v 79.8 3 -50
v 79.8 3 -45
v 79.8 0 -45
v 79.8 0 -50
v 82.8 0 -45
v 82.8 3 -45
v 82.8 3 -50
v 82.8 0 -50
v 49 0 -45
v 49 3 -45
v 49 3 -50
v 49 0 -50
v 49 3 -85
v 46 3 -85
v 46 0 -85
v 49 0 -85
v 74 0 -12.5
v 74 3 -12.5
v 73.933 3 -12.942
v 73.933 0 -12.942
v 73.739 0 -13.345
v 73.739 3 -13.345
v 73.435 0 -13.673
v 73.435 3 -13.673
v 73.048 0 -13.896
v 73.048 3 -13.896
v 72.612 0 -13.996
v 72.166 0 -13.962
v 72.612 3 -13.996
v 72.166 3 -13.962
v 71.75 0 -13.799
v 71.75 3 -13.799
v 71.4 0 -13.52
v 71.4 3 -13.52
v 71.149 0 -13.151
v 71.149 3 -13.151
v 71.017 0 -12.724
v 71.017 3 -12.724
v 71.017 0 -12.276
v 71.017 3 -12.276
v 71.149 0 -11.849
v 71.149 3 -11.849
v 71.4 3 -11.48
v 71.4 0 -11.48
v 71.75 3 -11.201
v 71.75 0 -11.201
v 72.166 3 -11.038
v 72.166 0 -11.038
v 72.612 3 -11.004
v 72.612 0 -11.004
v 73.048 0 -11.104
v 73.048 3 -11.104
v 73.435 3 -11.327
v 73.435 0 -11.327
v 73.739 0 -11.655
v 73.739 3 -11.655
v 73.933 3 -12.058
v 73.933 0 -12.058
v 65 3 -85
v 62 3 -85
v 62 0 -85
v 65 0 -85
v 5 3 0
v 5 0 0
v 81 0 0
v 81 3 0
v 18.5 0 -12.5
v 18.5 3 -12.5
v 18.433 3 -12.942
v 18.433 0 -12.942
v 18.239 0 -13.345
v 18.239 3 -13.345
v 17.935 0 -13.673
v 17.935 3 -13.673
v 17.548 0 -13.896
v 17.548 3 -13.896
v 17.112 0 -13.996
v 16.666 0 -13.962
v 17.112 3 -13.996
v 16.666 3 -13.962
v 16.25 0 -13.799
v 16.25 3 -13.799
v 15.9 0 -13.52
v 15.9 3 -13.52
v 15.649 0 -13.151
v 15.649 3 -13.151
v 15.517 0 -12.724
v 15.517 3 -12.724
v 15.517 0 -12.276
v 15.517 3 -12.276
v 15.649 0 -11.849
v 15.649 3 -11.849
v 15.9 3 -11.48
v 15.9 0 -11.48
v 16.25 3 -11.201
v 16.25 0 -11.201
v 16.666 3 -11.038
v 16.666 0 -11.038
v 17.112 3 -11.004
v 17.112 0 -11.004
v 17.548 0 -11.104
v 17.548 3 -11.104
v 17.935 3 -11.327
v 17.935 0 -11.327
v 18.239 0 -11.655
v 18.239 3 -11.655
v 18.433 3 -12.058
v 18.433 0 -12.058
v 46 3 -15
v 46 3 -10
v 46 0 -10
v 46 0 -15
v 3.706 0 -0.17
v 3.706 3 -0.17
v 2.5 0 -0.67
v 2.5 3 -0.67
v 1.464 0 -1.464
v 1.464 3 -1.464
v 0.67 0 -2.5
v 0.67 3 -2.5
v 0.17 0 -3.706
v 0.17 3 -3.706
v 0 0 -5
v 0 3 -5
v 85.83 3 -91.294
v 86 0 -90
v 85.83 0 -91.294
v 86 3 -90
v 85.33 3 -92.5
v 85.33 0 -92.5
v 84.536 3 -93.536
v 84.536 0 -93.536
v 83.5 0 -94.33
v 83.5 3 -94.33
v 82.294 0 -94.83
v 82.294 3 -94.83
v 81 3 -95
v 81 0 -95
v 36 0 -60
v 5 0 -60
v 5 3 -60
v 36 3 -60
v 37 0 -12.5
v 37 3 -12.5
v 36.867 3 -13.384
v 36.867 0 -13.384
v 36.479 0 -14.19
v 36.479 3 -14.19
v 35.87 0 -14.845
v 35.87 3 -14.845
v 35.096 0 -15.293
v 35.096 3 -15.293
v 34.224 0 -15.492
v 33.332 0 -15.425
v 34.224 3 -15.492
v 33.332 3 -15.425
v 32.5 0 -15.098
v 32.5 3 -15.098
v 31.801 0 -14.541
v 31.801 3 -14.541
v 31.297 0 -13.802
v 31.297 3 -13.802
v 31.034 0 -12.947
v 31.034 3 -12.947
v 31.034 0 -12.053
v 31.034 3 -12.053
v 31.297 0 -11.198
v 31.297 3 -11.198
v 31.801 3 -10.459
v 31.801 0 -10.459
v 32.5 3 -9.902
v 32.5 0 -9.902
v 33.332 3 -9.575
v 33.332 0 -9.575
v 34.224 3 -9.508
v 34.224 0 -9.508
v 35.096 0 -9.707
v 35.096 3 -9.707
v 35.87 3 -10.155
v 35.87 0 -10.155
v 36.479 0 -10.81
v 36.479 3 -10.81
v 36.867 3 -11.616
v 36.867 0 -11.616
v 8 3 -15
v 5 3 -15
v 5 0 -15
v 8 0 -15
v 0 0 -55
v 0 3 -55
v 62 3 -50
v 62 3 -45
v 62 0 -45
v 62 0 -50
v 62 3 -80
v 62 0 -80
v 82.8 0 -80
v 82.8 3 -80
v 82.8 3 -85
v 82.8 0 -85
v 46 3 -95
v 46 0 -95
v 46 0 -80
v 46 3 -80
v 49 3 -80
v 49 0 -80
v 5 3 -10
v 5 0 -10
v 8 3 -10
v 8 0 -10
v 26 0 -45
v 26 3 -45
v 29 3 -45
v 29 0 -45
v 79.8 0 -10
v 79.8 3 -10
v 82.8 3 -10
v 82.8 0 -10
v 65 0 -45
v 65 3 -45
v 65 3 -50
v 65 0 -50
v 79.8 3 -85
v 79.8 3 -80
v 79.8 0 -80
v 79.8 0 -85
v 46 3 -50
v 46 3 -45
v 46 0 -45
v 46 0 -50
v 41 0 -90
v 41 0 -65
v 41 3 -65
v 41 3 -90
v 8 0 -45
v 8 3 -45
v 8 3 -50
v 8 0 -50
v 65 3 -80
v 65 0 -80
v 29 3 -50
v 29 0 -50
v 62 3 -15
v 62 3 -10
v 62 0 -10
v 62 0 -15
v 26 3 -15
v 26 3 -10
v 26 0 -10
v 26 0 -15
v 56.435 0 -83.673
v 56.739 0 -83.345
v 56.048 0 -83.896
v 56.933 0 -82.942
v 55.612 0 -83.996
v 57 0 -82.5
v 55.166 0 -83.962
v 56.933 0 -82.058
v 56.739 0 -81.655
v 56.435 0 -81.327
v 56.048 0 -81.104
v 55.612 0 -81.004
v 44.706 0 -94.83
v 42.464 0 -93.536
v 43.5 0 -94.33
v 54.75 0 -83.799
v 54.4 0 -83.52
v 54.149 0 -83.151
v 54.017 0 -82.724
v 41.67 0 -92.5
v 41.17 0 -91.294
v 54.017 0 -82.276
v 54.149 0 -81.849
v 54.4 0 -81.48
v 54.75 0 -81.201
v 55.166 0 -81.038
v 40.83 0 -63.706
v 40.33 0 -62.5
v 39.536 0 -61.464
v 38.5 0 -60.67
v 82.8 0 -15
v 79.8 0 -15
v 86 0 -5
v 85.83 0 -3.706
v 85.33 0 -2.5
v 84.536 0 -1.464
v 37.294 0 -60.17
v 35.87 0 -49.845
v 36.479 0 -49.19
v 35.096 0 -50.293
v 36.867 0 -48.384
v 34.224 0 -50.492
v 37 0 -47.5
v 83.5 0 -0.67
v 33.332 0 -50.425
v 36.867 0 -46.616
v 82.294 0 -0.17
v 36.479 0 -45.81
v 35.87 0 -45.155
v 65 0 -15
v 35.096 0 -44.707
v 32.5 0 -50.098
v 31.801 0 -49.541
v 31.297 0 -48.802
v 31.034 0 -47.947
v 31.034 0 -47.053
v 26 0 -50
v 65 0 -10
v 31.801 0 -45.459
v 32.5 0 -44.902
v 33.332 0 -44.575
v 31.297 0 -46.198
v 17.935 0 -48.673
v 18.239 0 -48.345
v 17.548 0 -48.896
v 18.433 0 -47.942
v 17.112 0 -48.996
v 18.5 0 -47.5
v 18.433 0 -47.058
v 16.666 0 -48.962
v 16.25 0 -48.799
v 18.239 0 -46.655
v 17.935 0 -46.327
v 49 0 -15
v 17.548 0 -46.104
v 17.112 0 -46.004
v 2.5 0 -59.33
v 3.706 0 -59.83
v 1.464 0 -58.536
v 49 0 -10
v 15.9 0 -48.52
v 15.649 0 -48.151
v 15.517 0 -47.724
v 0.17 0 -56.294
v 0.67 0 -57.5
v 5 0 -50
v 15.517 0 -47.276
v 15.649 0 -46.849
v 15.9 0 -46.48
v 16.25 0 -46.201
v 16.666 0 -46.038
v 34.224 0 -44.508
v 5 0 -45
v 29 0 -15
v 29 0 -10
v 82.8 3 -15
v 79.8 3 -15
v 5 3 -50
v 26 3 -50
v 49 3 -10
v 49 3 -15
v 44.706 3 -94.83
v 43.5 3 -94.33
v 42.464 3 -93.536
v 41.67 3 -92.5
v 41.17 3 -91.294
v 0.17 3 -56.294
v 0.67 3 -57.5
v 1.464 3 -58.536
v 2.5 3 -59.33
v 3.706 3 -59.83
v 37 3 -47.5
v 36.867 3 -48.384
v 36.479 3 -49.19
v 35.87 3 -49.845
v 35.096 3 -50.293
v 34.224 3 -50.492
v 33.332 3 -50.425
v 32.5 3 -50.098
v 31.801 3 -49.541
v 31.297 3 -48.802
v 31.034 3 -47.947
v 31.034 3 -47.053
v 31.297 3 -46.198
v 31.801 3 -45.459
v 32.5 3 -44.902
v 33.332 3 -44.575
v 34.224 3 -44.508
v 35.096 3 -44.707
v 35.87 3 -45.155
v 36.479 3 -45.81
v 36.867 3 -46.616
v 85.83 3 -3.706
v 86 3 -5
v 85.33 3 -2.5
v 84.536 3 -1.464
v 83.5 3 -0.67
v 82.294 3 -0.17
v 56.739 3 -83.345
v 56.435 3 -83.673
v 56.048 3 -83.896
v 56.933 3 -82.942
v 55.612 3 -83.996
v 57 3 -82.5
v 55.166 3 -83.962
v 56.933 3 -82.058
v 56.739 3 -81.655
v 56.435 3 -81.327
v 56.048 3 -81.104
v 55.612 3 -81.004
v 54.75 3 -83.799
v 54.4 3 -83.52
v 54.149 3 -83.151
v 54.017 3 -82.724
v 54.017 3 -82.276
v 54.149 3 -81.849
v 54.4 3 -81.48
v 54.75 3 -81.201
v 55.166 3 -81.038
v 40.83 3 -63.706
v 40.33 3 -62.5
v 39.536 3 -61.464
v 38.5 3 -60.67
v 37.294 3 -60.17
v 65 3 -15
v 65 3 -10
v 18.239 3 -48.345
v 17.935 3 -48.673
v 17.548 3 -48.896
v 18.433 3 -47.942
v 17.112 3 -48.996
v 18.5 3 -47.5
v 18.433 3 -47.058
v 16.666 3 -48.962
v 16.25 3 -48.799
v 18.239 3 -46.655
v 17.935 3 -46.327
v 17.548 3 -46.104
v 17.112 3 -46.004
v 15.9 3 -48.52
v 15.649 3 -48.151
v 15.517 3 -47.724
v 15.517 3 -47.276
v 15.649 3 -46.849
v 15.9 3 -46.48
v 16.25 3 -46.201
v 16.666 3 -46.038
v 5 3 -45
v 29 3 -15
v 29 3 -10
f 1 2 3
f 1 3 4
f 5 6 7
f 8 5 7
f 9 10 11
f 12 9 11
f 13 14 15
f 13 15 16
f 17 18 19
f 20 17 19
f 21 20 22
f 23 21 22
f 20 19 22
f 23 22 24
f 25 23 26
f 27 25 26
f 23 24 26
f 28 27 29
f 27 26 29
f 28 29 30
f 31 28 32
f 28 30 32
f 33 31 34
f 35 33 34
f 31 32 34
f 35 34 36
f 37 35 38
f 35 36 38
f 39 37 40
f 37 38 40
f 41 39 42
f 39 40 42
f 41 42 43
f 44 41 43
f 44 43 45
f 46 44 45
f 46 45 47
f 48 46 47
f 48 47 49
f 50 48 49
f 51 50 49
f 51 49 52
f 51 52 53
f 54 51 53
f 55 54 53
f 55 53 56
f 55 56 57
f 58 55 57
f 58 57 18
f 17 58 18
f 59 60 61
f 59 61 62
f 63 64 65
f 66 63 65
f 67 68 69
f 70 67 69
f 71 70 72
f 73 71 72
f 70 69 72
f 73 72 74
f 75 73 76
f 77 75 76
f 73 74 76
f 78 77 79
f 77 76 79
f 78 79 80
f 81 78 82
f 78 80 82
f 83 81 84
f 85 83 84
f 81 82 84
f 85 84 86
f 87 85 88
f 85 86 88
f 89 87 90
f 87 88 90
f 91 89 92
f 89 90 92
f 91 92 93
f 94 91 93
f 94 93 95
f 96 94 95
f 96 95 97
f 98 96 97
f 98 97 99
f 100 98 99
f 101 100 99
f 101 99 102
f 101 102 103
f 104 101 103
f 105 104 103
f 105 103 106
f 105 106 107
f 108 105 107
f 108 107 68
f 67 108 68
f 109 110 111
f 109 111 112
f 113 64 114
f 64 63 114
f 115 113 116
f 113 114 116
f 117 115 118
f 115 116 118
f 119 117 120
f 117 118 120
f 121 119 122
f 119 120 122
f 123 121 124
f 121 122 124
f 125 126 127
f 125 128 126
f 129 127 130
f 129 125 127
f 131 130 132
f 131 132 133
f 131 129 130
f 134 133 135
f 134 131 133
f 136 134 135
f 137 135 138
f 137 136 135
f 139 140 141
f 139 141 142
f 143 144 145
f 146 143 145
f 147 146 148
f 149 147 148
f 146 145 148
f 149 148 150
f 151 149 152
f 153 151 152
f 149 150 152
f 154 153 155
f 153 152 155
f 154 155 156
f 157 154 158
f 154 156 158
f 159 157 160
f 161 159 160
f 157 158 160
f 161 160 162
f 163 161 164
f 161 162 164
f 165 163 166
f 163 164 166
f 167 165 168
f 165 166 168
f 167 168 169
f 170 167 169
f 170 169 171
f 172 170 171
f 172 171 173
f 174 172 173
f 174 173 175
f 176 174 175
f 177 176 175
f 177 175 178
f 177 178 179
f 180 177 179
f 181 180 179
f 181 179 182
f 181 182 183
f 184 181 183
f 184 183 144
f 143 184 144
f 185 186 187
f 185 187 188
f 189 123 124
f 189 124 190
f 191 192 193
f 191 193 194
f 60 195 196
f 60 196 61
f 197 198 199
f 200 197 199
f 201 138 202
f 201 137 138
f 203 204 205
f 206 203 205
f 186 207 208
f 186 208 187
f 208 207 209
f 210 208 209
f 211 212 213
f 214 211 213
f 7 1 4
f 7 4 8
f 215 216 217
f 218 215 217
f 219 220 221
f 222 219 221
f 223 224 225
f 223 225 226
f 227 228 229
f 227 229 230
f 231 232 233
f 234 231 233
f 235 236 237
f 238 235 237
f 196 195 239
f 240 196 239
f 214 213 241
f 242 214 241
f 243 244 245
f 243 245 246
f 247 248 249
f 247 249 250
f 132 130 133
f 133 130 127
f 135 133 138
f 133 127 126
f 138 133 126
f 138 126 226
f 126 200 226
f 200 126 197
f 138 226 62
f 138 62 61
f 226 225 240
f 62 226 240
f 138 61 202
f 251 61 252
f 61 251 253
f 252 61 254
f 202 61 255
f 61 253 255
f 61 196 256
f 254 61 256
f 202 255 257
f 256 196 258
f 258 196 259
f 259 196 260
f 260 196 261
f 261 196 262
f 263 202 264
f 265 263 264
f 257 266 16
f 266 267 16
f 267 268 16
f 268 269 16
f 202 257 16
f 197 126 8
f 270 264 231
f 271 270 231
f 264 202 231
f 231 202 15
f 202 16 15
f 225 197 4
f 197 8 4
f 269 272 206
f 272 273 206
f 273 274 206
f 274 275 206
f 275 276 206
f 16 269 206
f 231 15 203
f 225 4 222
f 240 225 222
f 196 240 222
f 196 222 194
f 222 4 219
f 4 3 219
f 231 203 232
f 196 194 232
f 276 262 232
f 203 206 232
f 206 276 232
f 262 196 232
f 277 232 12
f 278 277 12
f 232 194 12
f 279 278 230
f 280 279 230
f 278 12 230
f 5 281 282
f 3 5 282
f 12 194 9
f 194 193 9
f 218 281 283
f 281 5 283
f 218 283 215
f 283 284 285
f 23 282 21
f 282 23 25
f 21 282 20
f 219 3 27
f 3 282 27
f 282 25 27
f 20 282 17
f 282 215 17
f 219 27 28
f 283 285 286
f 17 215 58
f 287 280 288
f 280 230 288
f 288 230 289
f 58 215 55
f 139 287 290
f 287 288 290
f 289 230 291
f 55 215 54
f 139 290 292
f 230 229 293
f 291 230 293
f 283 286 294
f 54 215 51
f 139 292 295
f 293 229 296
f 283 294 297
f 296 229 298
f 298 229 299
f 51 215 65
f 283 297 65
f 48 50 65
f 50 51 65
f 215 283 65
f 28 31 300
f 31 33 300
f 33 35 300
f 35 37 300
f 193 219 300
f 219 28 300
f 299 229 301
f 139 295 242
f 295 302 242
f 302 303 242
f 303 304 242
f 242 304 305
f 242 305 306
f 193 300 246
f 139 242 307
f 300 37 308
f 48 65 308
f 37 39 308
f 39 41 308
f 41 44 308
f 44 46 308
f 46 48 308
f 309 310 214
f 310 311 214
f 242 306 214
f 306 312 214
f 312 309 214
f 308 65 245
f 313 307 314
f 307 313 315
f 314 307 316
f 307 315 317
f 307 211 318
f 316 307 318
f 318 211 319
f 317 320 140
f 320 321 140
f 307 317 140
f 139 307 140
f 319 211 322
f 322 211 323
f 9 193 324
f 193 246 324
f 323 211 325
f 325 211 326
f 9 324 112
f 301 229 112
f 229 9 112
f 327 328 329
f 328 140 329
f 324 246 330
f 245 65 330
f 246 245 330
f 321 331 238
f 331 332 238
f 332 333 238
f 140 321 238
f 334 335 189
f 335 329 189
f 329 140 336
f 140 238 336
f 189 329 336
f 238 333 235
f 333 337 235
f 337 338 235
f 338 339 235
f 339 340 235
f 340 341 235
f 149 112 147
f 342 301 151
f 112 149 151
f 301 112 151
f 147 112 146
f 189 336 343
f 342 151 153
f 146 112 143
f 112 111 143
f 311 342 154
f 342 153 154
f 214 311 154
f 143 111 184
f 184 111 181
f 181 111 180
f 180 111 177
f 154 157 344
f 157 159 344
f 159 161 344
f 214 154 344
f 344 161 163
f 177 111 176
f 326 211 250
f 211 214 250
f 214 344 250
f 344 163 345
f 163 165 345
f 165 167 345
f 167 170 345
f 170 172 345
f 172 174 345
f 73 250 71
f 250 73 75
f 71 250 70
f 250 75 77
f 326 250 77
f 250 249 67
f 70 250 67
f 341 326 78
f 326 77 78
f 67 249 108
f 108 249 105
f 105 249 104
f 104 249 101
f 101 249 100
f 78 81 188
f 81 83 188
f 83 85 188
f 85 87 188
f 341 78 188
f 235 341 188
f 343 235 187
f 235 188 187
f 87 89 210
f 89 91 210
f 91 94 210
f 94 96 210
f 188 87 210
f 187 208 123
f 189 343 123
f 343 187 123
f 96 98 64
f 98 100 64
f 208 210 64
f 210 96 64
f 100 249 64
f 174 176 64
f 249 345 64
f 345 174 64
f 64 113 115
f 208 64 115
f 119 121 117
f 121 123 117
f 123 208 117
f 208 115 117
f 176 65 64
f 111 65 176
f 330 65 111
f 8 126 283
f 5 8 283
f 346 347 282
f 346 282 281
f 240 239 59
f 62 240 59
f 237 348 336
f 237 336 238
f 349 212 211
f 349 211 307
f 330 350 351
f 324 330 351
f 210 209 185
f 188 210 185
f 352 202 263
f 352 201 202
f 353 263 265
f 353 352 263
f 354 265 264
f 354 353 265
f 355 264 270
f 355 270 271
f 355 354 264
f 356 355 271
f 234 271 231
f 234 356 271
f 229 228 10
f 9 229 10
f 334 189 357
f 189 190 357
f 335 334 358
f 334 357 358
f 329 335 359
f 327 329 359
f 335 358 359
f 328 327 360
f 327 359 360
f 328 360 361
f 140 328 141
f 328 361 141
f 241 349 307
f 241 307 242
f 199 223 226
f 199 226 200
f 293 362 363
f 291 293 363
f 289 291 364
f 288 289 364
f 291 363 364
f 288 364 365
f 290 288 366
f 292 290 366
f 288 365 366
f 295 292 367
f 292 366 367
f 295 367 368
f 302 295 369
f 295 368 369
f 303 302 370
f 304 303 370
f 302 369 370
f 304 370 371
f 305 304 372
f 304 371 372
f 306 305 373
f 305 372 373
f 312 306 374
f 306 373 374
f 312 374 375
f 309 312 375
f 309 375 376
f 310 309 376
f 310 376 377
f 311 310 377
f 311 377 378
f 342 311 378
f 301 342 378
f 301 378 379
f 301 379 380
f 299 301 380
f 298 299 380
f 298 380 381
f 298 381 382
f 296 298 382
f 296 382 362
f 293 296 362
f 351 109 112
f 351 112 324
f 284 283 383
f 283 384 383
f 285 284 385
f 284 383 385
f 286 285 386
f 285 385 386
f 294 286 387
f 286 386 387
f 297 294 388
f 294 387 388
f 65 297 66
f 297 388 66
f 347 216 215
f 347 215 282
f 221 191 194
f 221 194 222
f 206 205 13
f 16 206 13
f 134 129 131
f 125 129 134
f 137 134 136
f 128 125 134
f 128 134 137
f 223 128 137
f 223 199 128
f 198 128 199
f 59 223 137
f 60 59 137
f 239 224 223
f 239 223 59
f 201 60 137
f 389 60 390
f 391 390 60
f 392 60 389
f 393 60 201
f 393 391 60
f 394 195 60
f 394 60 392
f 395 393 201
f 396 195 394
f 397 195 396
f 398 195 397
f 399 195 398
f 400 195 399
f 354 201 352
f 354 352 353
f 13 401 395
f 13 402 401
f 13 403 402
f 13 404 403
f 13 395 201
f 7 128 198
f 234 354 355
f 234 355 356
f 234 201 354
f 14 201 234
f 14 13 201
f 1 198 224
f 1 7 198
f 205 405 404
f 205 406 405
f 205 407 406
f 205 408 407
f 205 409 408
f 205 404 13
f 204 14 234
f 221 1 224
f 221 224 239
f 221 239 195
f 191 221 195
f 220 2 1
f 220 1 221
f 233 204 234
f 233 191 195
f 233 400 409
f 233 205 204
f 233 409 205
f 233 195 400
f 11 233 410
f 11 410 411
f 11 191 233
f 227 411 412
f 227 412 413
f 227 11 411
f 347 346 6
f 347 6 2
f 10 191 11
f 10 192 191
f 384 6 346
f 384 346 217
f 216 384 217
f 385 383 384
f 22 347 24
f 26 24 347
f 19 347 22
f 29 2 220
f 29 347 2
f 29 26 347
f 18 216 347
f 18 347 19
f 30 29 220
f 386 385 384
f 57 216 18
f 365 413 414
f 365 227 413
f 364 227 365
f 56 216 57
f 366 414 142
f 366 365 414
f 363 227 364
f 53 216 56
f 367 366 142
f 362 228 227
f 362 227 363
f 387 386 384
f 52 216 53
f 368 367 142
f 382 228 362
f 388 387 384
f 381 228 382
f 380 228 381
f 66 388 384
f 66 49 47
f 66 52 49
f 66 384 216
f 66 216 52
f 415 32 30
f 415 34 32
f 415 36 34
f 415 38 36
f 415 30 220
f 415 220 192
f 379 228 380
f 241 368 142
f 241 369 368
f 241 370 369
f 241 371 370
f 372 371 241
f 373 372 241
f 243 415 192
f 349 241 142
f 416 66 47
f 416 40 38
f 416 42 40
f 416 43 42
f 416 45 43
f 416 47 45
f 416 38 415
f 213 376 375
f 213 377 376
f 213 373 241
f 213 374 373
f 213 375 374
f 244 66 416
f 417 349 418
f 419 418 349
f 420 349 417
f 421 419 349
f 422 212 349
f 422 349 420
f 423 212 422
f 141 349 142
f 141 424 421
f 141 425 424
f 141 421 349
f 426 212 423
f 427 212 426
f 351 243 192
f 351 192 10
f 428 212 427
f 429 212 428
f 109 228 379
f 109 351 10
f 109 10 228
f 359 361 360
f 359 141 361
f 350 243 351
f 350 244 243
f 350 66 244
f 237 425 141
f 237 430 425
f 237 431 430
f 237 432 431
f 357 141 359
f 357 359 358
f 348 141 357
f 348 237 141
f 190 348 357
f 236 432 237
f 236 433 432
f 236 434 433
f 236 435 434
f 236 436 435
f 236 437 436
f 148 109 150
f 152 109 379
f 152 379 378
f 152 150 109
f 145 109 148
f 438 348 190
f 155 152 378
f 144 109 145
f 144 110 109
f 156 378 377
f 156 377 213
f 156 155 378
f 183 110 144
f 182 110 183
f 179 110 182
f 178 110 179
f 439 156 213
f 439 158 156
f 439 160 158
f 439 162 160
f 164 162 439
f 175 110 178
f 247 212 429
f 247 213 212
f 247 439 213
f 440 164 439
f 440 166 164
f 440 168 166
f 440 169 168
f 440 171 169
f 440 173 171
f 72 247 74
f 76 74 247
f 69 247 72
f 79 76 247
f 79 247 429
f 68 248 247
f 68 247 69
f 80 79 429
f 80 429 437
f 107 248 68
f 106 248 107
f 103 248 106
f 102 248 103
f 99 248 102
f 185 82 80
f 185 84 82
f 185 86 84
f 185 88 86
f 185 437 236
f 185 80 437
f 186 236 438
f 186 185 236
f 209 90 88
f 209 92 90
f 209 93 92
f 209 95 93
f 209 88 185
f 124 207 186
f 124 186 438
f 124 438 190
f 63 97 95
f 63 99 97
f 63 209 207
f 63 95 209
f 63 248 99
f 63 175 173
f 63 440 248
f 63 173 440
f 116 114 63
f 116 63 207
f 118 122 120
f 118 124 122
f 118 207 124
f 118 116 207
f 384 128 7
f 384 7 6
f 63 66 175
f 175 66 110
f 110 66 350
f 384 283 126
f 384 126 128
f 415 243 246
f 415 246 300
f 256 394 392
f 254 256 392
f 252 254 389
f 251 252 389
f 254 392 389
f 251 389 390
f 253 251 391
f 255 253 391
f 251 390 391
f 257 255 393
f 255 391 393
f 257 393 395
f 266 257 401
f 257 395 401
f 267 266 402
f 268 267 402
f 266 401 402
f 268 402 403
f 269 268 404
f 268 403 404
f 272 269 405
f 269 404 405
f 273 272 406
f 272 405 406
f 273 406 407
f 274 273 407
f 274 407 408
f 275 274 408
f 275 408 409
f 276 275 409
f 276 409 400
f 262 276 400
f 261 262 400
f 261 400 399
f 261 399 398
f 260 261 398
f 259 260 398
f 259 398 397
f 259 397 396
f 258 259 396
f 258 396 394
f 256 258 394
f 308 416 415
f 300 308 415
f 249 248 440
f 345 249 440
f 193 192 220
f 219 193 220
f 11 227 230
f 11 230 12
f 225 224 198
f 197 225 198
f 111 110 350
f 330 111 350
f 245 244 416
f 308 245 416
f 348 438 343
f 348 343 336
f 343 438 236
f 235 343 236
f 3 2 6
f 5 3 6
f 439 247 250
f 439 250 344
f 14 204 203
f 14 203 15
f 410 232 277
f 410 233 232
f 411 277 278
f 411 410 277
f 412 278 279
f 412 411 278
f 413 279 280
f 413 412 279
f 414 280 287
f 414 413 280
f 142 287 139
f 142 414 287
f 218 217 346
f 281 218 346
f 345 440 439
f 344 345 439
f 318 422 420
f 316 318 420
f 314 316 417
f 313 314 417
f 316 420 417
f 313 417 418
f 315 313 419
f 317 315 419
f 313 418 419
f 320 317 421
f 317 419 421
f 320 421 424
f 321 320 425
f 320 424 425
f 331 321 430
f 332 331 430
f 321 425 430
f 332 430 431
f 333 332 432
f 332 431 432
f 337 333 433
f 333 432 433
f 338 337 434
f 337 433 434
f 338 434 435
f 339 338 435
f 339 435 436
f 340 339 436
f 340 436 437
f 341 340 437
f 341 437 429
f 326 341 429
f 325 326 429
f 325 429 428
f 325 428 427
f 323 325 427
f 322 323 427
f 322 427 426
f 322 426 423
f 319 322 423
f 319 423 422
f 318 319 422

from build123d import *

# Parameters (mm, degrees)
SKETCH1_W           = 86
SKETCH1_H           = 60
BOSS_EXTRUDE1_DEPTH = 3
SKETCH4_W           = 45
SKETCH4_H           = 3
BOSS_EXTRUDE2_DEPTH = 35
SKETCH2_W           = 3
SKETCH2_H           = 5
CUT_EXTRUDE1_DEPTH  = 3
SKETCH8_W           = 3
SKETCH8_H           = 5
CUT_EXTRUDE10_DEPTH = 4
LPATTERN3_COUNT     = 2
LPATTERN3_PITCH     = 35
FILLET1_R           = 5
LPATTERN1_COUNT     = 3
LPATTERN1_PITCH     = 35
SKETCH5_R           = 1.5
CUT_EXTRUDE2_DEPTH  = 4
SKETCH6_R           = 3
CUT_EXTRUDE3_DEPTH  = 4


with BuildPart() as part:
    # Sketch1 → Boss-Extrude1 (new body)
    with BuildSketch(Plane(origin=(0, 0, 0), x_dir=(1, 0, 0), z_dir=(0, 1, 0))):
        with Locations((43, 30)):
            Rectangle(SKETCH1_W, SKETCH1_H)
    extrude(amount=BOSS_EXTRUDE1_DEPTH)

    # Sketch4 → Boss-Extrude2 (add)
    with BuildSketch(Plane(origin=(0, 0, -60), x_dir=(-1, 0, 0), z_dir=(0, 0, -1))):
        with Locations((-63.5, 1.5)):
            Rectangle(SKETCH4_W, SKETCH4_H)
    extrude(amount=BOSS_EXTRUDE2_DEPTH)

    # Sketch2 → Cut-Extrude1 (cut)
    with BuildSketch(Plane(origin=(0, 3, 0), x_dir=(1, 0, 0), z_dir=(0, 1, 0))):
        with Locations((63.5, 12.5)):
            Rectangle(SKETCH2_W, SKETCH2_H)
        with Locations((47.5, 12.5)):
            Rectangle(SKETCH2_W, SKETCH2_H)
        with Locations((81.3, 12.5)):
            Rectangle(SKETCH2_W, SKETCH2_H)
    cut_extrude1 = extrude(amount=-CUT_EXTRUDE1_DEPTH, mode=Mode.SUBTRACT)

    # Sketch8 → Cut-Extrude10 (cut, through all)
    with BuildSketch(Plane(origin=(0, 3, 0), x_dir=(1, 0, 0), z_dir=(0, 1, 0))):
        with Locations((6.5, 12.5)):
            Rectangle(SKETCH8_W, SKETCH8_H)
        with Locations((27.5, 12.5)):
            Rectangle(SKETCH8_W, SKETCH8_H)
    cut_extrude10 = extrude(amount=-CUT_EXTRUDE10_DEPTH, mode=Mode.SUBTRACT)

    # LPattern3: Cut-Extrude10 ×2
    with Locations(*[(0, 0, -i * LPATTERN3_PITCH) for i in range(1, LPATTERN3_COUNT)]):
        add(cut_extrude10, mode=Mode.SUBTRACT)

    # Fillet1
    fillet1_edges = [part.edges().sort_by_distance(p)[0] for p in [
        (41, 1.5, -60),
        (86, 1.5, -95),
        (41, 1.5, -95),
        (0, 1.5, -60),
        (86, 1.5, 0),
        (0, 1.5, 0),
    ]]
    fillet(fillet1_edges, radius=FILLET1_R)

    # LPattern1: Cut-Extrude1 ×3
    with Locations(*[(0, 0, -i * LPATTERN1_PITCH) for i in range(1, LPATTERN1_COUNT)]):
        add(cut_extrude1, mode=Mode.SUBTRACT)

    # Sketch5 → Cut-Extrude2 (cut, through all)
    with BuildSketch(Plane(origin=(0, 3, 0), x_dir=(1, 0, 0), z_dir=(0, 1, 0))):
        with Locations((17, 12.5)):
            Circle(SKETCH5_R)
        with Locations((17, 47.5)):
            Circle(SKETCH5_R)
        with Locations((72.5, 12.5)):
            Circle(SKETCH5_R)
        with Locations((55.5, 82.5)):
            Circle(SKETCH5_R)
    extrude(amount=-CUT_EXTRUDE2_DEPTH, mode=Mode.SUBTRACT)

    # Sketch6 → Cut-Extrude3 (cut, through all)
    with BuildSketch(Plane(origin=(0, 3, 0), x_dir=(1, 0, 0), z_dir=(0, 1, 0))):
        with Locations((34, 12.5)):
            Circle(SKETCH6_R)
        with Locations((34, 47.5)):
            Circle(SKETCH6_R)
    extrude(amount=-CUT_EXTRUDE3_DEPTH, mode=Mode.SUBTRACT)


solid = part.part
